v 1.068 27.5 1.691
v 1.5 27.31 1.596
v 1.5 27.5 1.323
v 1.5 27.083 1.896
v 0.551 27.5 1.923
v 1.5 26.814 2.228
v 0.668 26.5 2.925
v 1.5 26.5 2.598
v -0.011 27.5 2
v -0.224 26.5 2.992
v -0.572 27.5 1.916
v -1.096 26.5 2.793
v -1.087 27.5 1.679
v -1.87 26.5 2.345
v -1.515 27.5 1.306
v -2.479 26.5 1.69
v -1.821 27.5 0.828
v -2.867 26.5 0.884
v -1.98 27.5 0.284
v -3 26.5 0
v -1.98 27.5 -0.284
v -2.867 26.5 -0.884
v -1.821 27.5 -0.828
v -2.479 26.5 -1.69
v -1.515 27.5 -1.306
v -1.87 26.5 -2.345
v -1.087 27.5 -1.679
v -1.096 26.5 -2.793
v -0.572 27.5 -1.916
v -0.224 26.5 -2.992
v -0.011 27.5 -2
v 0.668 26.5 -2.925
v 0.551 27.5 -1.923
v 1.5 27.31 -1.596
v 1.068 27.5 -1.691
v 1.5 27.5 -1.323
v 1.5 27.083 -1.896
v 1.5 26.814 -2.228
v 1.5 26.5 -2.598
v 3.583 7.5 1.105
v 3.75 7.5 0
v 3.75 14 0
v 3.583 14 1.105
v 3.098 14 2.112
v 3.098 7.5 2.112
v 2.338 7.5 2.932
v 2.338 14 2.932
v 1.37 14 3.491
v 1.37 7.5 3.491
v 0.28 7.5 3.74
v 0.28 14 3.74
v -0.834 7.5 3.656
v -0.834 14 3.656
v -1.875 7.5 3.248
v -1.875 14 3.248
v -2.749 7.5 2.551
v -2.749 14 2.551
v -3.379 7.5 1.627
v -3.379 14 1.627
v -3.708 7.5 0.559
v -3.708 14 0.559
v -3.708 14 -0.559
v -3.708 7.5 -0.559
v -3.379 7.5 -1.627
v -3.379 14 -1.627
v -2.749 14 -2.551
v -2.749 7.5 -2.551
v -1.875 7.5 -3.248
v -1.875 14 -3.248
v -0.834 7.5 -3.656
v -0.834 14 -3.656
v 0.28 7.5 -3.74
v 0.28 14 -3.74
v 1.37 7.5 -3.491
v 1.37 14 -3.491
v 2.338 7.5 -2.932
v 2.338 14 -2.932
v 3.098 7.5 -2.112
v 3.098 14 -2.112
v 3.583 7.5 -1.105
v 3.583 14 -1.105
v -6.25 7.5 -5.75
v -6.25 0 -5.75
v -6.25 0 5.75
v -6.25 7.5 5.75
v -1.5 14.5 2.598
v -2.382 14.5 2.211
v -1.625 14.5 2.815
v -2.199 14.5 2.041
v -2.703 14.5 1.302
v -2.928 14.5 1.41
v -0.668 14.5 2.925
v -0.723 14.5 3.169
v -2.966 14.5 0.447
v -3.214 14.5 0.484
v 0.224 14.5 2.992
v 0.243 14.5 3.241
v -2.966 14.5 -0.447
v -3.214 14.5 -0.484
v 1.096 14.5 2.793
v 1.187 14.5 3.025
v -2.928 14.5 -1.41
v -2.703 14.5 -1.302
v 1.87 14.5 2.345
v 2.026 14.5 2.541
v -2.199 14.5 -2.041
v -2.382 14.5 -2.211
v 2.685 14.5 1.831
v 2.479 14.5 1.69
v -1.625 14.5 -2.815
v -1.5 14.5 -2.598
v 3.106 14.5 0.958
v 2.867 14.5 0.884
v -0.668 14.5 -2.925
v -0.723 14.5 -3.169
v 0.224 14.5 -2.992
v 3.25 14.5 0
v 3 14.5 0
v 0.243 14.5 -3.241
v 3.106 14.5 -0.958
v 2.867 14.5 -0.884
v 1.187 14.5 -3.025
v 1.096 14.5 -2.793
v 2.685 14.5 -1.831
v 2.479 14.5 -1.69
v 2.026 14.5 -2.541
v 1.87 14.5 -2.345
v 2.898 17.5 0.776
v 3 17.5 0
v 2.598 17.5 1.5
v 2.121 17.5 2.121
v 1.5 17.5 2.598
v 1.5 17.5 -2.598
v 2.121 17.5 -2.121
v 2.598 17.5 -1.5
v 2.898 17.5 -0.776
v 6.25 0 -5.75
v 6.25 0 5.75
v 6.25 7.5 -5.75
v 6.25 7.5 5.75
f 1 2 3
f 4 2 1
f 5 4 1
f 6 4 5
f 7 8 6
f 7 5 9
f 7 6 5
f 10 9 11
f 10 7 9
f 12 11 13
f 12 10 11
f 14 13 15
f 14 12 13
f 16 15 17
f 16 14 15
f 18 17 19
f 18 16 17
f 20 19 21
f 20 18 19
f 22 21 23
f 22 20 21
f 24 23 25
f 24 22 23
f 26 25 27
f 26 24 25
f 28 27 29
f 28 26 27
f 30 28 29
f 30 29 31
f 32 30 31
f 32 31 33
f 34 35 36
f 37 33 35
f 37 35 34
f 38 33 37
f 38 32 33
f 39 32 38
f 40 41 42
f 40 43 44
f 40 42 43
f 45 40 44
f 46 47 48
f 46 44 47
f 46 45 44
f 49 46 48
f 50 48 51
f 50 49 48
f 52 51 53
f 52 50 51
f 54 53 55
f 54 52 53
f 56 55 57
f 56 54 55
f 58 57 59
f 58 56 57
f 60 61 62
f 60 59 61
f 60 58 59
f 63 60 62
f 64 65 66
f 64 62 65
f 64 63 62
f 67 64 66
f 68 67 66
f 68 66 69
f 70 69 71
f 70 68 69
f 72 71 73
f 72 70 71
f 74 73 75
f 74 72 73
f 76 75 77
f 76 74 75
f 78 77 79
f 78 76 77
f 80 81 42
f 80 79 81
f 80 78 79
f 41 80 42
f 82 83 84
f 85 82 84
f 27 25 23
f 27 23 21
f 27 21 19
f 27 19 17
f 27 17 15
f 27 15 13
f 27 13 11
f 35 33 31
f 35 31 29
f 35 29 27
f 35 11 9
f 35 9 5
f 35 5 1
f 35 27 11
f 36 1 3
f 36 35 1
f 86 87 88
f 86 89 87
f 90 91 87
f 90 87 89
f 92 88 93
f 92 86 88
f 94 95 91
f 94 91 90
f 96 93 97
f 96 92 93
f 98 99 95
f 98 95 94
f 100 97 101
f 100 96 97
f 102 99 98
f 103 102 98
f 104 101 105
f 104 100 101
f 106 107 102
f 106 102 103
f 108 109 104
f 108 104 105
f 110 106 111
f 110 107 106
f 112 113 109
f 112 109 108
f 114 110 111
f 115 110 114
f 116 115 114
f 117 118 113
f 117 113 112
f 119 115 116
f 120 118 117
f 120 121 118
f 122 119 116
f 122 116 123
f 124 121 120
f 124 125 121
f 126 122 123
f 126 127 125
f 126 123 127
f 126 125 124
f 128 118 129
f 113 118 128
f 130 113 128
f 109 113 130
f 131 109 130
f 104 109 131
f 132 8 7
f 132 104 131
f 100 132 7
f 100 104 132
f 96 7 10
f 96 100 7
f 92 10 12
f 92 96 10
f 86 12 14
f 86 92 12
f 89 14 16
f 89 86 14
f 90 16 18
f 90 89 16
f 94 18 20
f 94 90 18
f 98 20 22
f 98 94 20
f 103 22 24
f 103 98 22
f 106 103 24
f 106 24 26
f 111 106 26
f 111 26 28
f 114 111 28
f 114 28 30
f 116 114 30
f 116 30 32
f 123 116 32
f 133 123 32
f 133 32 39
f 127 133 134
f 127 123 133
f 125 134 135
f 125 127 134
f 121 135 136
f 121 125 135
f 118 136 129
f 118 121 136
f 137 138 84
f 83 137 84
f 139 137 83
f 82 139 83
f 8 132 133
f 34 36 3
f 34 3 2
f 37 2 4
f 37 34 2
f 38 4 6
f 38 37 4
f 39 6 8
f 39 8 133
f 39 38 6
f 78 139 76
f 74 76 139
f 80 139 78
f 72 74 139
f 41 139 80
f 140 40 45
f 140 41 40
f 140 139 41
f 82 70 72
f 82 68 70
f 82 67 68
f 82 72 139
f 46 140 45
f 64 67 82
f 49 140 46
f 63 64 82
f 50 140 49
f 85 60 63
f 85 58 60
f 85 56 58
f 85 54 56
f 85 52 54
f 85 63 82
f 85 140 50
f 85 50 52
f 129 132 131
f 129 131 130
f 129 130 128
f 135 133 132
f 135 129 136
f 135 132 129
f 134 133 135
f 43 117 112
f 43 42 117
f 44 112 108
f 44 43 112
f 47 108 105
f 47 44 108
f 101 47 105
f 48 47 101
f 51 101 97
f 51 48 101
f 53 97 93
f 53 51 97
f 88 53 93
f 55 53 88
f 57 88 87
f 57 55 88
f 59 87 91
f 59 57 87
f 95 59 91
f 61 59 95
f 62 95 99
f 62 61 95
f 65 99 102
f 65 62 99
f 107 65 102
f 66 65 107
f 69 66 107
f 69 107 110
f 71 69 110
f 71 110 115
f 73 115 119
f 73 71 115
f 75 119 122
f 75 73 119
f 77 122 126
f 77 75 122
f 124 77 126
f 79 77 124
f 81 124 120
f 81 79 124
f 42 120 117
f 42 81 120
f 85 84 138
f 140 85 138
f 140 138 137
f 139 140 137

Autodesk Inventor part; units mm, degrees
ref_plane "YZ Plane" through (0, 0, 0) normal (1, 0, 0) x (0, 1, 0)
ref_plane "XZ Plane" through (0, 0, 0) normal (0, 1, 0) x (-1, 0, 0)
ref_plane "XY Plane" through (0, 0, 0) normal (0, 0, 1) x (1, 0, 0)
sketch "Sketch1" plane through (0, 0, 0) normal (0, 1, 0) x (-1, 0, 0)
  line L0 (6.25, 5.75) -> (-6.25, 5.75)
  line L1 (-6.25, 5.75) -> (-6.25, -5.75)
  line L2 (-6.25, -5.75) -> (6.25, -5.75)
  line L3 (6.25, -5.75) -> (6.25, 5.75)
  line L4 (6.25, 5.75) -> (-6.25, -5.75) construction
  line L5 (-6.25, 5.75) -> (6.25, -5.75) construction
  point P0 (0, 0)
  dimension "d0" = 12.5
  dimension "d1" = 11.5
extrude "Extrusion1" add sketch "Sketch1" along normal blind 7.5
sketch "Sketch2" plane through (0, 7.5, 0) normal (0, 1, 0) x (1, 0, 0)
  circle A0 centre (0, 0) radius 3.75
  dimension "d4" = 7.5
extrude "Extrusion2" add sketch "Sketch2" along normal blind 7
sketch "Sketch3" plane through (0, 14.5, 0) normal (0, 1, 0) x (1, 0, 0)
  circle A0 centre (0, 0) radius 3
  dimension "d7" = 6
extrude "Extrusion3" add sketch "Sketch3" along normal blind 13
sketch "Sketch4" plane through (0, 27.5, 0) normal (0, 1, 0) x (1, 0, 0)
  circle A0 centre (0, 0) radius 3 projected
  line L0 (1.5, -2.5981) -> (1.5, 2.5981)
  line L1 (3, 0) -> (-9, 0) construction
  circle A1 centre (0, 0) radius 3.75 construction
  circle A2 centre (0, 0) radius 3 construction
  point P0 (-3, 0)
  dimension "d10" = 4.5
extrude "Extrusion4" cut sketch "Sketch4" against normal blind 10 contours A0 L0 picked at (1.6691, 0.7431)
chamfer "Chamfer1" distance 0.5 angle 45 1 edges at (-3.75, 14.5, 0)
chamfer "Chamfer2" distance 1 angle 45 1 edges at (-3, 27.5, 0)
properties part number "rotery"
